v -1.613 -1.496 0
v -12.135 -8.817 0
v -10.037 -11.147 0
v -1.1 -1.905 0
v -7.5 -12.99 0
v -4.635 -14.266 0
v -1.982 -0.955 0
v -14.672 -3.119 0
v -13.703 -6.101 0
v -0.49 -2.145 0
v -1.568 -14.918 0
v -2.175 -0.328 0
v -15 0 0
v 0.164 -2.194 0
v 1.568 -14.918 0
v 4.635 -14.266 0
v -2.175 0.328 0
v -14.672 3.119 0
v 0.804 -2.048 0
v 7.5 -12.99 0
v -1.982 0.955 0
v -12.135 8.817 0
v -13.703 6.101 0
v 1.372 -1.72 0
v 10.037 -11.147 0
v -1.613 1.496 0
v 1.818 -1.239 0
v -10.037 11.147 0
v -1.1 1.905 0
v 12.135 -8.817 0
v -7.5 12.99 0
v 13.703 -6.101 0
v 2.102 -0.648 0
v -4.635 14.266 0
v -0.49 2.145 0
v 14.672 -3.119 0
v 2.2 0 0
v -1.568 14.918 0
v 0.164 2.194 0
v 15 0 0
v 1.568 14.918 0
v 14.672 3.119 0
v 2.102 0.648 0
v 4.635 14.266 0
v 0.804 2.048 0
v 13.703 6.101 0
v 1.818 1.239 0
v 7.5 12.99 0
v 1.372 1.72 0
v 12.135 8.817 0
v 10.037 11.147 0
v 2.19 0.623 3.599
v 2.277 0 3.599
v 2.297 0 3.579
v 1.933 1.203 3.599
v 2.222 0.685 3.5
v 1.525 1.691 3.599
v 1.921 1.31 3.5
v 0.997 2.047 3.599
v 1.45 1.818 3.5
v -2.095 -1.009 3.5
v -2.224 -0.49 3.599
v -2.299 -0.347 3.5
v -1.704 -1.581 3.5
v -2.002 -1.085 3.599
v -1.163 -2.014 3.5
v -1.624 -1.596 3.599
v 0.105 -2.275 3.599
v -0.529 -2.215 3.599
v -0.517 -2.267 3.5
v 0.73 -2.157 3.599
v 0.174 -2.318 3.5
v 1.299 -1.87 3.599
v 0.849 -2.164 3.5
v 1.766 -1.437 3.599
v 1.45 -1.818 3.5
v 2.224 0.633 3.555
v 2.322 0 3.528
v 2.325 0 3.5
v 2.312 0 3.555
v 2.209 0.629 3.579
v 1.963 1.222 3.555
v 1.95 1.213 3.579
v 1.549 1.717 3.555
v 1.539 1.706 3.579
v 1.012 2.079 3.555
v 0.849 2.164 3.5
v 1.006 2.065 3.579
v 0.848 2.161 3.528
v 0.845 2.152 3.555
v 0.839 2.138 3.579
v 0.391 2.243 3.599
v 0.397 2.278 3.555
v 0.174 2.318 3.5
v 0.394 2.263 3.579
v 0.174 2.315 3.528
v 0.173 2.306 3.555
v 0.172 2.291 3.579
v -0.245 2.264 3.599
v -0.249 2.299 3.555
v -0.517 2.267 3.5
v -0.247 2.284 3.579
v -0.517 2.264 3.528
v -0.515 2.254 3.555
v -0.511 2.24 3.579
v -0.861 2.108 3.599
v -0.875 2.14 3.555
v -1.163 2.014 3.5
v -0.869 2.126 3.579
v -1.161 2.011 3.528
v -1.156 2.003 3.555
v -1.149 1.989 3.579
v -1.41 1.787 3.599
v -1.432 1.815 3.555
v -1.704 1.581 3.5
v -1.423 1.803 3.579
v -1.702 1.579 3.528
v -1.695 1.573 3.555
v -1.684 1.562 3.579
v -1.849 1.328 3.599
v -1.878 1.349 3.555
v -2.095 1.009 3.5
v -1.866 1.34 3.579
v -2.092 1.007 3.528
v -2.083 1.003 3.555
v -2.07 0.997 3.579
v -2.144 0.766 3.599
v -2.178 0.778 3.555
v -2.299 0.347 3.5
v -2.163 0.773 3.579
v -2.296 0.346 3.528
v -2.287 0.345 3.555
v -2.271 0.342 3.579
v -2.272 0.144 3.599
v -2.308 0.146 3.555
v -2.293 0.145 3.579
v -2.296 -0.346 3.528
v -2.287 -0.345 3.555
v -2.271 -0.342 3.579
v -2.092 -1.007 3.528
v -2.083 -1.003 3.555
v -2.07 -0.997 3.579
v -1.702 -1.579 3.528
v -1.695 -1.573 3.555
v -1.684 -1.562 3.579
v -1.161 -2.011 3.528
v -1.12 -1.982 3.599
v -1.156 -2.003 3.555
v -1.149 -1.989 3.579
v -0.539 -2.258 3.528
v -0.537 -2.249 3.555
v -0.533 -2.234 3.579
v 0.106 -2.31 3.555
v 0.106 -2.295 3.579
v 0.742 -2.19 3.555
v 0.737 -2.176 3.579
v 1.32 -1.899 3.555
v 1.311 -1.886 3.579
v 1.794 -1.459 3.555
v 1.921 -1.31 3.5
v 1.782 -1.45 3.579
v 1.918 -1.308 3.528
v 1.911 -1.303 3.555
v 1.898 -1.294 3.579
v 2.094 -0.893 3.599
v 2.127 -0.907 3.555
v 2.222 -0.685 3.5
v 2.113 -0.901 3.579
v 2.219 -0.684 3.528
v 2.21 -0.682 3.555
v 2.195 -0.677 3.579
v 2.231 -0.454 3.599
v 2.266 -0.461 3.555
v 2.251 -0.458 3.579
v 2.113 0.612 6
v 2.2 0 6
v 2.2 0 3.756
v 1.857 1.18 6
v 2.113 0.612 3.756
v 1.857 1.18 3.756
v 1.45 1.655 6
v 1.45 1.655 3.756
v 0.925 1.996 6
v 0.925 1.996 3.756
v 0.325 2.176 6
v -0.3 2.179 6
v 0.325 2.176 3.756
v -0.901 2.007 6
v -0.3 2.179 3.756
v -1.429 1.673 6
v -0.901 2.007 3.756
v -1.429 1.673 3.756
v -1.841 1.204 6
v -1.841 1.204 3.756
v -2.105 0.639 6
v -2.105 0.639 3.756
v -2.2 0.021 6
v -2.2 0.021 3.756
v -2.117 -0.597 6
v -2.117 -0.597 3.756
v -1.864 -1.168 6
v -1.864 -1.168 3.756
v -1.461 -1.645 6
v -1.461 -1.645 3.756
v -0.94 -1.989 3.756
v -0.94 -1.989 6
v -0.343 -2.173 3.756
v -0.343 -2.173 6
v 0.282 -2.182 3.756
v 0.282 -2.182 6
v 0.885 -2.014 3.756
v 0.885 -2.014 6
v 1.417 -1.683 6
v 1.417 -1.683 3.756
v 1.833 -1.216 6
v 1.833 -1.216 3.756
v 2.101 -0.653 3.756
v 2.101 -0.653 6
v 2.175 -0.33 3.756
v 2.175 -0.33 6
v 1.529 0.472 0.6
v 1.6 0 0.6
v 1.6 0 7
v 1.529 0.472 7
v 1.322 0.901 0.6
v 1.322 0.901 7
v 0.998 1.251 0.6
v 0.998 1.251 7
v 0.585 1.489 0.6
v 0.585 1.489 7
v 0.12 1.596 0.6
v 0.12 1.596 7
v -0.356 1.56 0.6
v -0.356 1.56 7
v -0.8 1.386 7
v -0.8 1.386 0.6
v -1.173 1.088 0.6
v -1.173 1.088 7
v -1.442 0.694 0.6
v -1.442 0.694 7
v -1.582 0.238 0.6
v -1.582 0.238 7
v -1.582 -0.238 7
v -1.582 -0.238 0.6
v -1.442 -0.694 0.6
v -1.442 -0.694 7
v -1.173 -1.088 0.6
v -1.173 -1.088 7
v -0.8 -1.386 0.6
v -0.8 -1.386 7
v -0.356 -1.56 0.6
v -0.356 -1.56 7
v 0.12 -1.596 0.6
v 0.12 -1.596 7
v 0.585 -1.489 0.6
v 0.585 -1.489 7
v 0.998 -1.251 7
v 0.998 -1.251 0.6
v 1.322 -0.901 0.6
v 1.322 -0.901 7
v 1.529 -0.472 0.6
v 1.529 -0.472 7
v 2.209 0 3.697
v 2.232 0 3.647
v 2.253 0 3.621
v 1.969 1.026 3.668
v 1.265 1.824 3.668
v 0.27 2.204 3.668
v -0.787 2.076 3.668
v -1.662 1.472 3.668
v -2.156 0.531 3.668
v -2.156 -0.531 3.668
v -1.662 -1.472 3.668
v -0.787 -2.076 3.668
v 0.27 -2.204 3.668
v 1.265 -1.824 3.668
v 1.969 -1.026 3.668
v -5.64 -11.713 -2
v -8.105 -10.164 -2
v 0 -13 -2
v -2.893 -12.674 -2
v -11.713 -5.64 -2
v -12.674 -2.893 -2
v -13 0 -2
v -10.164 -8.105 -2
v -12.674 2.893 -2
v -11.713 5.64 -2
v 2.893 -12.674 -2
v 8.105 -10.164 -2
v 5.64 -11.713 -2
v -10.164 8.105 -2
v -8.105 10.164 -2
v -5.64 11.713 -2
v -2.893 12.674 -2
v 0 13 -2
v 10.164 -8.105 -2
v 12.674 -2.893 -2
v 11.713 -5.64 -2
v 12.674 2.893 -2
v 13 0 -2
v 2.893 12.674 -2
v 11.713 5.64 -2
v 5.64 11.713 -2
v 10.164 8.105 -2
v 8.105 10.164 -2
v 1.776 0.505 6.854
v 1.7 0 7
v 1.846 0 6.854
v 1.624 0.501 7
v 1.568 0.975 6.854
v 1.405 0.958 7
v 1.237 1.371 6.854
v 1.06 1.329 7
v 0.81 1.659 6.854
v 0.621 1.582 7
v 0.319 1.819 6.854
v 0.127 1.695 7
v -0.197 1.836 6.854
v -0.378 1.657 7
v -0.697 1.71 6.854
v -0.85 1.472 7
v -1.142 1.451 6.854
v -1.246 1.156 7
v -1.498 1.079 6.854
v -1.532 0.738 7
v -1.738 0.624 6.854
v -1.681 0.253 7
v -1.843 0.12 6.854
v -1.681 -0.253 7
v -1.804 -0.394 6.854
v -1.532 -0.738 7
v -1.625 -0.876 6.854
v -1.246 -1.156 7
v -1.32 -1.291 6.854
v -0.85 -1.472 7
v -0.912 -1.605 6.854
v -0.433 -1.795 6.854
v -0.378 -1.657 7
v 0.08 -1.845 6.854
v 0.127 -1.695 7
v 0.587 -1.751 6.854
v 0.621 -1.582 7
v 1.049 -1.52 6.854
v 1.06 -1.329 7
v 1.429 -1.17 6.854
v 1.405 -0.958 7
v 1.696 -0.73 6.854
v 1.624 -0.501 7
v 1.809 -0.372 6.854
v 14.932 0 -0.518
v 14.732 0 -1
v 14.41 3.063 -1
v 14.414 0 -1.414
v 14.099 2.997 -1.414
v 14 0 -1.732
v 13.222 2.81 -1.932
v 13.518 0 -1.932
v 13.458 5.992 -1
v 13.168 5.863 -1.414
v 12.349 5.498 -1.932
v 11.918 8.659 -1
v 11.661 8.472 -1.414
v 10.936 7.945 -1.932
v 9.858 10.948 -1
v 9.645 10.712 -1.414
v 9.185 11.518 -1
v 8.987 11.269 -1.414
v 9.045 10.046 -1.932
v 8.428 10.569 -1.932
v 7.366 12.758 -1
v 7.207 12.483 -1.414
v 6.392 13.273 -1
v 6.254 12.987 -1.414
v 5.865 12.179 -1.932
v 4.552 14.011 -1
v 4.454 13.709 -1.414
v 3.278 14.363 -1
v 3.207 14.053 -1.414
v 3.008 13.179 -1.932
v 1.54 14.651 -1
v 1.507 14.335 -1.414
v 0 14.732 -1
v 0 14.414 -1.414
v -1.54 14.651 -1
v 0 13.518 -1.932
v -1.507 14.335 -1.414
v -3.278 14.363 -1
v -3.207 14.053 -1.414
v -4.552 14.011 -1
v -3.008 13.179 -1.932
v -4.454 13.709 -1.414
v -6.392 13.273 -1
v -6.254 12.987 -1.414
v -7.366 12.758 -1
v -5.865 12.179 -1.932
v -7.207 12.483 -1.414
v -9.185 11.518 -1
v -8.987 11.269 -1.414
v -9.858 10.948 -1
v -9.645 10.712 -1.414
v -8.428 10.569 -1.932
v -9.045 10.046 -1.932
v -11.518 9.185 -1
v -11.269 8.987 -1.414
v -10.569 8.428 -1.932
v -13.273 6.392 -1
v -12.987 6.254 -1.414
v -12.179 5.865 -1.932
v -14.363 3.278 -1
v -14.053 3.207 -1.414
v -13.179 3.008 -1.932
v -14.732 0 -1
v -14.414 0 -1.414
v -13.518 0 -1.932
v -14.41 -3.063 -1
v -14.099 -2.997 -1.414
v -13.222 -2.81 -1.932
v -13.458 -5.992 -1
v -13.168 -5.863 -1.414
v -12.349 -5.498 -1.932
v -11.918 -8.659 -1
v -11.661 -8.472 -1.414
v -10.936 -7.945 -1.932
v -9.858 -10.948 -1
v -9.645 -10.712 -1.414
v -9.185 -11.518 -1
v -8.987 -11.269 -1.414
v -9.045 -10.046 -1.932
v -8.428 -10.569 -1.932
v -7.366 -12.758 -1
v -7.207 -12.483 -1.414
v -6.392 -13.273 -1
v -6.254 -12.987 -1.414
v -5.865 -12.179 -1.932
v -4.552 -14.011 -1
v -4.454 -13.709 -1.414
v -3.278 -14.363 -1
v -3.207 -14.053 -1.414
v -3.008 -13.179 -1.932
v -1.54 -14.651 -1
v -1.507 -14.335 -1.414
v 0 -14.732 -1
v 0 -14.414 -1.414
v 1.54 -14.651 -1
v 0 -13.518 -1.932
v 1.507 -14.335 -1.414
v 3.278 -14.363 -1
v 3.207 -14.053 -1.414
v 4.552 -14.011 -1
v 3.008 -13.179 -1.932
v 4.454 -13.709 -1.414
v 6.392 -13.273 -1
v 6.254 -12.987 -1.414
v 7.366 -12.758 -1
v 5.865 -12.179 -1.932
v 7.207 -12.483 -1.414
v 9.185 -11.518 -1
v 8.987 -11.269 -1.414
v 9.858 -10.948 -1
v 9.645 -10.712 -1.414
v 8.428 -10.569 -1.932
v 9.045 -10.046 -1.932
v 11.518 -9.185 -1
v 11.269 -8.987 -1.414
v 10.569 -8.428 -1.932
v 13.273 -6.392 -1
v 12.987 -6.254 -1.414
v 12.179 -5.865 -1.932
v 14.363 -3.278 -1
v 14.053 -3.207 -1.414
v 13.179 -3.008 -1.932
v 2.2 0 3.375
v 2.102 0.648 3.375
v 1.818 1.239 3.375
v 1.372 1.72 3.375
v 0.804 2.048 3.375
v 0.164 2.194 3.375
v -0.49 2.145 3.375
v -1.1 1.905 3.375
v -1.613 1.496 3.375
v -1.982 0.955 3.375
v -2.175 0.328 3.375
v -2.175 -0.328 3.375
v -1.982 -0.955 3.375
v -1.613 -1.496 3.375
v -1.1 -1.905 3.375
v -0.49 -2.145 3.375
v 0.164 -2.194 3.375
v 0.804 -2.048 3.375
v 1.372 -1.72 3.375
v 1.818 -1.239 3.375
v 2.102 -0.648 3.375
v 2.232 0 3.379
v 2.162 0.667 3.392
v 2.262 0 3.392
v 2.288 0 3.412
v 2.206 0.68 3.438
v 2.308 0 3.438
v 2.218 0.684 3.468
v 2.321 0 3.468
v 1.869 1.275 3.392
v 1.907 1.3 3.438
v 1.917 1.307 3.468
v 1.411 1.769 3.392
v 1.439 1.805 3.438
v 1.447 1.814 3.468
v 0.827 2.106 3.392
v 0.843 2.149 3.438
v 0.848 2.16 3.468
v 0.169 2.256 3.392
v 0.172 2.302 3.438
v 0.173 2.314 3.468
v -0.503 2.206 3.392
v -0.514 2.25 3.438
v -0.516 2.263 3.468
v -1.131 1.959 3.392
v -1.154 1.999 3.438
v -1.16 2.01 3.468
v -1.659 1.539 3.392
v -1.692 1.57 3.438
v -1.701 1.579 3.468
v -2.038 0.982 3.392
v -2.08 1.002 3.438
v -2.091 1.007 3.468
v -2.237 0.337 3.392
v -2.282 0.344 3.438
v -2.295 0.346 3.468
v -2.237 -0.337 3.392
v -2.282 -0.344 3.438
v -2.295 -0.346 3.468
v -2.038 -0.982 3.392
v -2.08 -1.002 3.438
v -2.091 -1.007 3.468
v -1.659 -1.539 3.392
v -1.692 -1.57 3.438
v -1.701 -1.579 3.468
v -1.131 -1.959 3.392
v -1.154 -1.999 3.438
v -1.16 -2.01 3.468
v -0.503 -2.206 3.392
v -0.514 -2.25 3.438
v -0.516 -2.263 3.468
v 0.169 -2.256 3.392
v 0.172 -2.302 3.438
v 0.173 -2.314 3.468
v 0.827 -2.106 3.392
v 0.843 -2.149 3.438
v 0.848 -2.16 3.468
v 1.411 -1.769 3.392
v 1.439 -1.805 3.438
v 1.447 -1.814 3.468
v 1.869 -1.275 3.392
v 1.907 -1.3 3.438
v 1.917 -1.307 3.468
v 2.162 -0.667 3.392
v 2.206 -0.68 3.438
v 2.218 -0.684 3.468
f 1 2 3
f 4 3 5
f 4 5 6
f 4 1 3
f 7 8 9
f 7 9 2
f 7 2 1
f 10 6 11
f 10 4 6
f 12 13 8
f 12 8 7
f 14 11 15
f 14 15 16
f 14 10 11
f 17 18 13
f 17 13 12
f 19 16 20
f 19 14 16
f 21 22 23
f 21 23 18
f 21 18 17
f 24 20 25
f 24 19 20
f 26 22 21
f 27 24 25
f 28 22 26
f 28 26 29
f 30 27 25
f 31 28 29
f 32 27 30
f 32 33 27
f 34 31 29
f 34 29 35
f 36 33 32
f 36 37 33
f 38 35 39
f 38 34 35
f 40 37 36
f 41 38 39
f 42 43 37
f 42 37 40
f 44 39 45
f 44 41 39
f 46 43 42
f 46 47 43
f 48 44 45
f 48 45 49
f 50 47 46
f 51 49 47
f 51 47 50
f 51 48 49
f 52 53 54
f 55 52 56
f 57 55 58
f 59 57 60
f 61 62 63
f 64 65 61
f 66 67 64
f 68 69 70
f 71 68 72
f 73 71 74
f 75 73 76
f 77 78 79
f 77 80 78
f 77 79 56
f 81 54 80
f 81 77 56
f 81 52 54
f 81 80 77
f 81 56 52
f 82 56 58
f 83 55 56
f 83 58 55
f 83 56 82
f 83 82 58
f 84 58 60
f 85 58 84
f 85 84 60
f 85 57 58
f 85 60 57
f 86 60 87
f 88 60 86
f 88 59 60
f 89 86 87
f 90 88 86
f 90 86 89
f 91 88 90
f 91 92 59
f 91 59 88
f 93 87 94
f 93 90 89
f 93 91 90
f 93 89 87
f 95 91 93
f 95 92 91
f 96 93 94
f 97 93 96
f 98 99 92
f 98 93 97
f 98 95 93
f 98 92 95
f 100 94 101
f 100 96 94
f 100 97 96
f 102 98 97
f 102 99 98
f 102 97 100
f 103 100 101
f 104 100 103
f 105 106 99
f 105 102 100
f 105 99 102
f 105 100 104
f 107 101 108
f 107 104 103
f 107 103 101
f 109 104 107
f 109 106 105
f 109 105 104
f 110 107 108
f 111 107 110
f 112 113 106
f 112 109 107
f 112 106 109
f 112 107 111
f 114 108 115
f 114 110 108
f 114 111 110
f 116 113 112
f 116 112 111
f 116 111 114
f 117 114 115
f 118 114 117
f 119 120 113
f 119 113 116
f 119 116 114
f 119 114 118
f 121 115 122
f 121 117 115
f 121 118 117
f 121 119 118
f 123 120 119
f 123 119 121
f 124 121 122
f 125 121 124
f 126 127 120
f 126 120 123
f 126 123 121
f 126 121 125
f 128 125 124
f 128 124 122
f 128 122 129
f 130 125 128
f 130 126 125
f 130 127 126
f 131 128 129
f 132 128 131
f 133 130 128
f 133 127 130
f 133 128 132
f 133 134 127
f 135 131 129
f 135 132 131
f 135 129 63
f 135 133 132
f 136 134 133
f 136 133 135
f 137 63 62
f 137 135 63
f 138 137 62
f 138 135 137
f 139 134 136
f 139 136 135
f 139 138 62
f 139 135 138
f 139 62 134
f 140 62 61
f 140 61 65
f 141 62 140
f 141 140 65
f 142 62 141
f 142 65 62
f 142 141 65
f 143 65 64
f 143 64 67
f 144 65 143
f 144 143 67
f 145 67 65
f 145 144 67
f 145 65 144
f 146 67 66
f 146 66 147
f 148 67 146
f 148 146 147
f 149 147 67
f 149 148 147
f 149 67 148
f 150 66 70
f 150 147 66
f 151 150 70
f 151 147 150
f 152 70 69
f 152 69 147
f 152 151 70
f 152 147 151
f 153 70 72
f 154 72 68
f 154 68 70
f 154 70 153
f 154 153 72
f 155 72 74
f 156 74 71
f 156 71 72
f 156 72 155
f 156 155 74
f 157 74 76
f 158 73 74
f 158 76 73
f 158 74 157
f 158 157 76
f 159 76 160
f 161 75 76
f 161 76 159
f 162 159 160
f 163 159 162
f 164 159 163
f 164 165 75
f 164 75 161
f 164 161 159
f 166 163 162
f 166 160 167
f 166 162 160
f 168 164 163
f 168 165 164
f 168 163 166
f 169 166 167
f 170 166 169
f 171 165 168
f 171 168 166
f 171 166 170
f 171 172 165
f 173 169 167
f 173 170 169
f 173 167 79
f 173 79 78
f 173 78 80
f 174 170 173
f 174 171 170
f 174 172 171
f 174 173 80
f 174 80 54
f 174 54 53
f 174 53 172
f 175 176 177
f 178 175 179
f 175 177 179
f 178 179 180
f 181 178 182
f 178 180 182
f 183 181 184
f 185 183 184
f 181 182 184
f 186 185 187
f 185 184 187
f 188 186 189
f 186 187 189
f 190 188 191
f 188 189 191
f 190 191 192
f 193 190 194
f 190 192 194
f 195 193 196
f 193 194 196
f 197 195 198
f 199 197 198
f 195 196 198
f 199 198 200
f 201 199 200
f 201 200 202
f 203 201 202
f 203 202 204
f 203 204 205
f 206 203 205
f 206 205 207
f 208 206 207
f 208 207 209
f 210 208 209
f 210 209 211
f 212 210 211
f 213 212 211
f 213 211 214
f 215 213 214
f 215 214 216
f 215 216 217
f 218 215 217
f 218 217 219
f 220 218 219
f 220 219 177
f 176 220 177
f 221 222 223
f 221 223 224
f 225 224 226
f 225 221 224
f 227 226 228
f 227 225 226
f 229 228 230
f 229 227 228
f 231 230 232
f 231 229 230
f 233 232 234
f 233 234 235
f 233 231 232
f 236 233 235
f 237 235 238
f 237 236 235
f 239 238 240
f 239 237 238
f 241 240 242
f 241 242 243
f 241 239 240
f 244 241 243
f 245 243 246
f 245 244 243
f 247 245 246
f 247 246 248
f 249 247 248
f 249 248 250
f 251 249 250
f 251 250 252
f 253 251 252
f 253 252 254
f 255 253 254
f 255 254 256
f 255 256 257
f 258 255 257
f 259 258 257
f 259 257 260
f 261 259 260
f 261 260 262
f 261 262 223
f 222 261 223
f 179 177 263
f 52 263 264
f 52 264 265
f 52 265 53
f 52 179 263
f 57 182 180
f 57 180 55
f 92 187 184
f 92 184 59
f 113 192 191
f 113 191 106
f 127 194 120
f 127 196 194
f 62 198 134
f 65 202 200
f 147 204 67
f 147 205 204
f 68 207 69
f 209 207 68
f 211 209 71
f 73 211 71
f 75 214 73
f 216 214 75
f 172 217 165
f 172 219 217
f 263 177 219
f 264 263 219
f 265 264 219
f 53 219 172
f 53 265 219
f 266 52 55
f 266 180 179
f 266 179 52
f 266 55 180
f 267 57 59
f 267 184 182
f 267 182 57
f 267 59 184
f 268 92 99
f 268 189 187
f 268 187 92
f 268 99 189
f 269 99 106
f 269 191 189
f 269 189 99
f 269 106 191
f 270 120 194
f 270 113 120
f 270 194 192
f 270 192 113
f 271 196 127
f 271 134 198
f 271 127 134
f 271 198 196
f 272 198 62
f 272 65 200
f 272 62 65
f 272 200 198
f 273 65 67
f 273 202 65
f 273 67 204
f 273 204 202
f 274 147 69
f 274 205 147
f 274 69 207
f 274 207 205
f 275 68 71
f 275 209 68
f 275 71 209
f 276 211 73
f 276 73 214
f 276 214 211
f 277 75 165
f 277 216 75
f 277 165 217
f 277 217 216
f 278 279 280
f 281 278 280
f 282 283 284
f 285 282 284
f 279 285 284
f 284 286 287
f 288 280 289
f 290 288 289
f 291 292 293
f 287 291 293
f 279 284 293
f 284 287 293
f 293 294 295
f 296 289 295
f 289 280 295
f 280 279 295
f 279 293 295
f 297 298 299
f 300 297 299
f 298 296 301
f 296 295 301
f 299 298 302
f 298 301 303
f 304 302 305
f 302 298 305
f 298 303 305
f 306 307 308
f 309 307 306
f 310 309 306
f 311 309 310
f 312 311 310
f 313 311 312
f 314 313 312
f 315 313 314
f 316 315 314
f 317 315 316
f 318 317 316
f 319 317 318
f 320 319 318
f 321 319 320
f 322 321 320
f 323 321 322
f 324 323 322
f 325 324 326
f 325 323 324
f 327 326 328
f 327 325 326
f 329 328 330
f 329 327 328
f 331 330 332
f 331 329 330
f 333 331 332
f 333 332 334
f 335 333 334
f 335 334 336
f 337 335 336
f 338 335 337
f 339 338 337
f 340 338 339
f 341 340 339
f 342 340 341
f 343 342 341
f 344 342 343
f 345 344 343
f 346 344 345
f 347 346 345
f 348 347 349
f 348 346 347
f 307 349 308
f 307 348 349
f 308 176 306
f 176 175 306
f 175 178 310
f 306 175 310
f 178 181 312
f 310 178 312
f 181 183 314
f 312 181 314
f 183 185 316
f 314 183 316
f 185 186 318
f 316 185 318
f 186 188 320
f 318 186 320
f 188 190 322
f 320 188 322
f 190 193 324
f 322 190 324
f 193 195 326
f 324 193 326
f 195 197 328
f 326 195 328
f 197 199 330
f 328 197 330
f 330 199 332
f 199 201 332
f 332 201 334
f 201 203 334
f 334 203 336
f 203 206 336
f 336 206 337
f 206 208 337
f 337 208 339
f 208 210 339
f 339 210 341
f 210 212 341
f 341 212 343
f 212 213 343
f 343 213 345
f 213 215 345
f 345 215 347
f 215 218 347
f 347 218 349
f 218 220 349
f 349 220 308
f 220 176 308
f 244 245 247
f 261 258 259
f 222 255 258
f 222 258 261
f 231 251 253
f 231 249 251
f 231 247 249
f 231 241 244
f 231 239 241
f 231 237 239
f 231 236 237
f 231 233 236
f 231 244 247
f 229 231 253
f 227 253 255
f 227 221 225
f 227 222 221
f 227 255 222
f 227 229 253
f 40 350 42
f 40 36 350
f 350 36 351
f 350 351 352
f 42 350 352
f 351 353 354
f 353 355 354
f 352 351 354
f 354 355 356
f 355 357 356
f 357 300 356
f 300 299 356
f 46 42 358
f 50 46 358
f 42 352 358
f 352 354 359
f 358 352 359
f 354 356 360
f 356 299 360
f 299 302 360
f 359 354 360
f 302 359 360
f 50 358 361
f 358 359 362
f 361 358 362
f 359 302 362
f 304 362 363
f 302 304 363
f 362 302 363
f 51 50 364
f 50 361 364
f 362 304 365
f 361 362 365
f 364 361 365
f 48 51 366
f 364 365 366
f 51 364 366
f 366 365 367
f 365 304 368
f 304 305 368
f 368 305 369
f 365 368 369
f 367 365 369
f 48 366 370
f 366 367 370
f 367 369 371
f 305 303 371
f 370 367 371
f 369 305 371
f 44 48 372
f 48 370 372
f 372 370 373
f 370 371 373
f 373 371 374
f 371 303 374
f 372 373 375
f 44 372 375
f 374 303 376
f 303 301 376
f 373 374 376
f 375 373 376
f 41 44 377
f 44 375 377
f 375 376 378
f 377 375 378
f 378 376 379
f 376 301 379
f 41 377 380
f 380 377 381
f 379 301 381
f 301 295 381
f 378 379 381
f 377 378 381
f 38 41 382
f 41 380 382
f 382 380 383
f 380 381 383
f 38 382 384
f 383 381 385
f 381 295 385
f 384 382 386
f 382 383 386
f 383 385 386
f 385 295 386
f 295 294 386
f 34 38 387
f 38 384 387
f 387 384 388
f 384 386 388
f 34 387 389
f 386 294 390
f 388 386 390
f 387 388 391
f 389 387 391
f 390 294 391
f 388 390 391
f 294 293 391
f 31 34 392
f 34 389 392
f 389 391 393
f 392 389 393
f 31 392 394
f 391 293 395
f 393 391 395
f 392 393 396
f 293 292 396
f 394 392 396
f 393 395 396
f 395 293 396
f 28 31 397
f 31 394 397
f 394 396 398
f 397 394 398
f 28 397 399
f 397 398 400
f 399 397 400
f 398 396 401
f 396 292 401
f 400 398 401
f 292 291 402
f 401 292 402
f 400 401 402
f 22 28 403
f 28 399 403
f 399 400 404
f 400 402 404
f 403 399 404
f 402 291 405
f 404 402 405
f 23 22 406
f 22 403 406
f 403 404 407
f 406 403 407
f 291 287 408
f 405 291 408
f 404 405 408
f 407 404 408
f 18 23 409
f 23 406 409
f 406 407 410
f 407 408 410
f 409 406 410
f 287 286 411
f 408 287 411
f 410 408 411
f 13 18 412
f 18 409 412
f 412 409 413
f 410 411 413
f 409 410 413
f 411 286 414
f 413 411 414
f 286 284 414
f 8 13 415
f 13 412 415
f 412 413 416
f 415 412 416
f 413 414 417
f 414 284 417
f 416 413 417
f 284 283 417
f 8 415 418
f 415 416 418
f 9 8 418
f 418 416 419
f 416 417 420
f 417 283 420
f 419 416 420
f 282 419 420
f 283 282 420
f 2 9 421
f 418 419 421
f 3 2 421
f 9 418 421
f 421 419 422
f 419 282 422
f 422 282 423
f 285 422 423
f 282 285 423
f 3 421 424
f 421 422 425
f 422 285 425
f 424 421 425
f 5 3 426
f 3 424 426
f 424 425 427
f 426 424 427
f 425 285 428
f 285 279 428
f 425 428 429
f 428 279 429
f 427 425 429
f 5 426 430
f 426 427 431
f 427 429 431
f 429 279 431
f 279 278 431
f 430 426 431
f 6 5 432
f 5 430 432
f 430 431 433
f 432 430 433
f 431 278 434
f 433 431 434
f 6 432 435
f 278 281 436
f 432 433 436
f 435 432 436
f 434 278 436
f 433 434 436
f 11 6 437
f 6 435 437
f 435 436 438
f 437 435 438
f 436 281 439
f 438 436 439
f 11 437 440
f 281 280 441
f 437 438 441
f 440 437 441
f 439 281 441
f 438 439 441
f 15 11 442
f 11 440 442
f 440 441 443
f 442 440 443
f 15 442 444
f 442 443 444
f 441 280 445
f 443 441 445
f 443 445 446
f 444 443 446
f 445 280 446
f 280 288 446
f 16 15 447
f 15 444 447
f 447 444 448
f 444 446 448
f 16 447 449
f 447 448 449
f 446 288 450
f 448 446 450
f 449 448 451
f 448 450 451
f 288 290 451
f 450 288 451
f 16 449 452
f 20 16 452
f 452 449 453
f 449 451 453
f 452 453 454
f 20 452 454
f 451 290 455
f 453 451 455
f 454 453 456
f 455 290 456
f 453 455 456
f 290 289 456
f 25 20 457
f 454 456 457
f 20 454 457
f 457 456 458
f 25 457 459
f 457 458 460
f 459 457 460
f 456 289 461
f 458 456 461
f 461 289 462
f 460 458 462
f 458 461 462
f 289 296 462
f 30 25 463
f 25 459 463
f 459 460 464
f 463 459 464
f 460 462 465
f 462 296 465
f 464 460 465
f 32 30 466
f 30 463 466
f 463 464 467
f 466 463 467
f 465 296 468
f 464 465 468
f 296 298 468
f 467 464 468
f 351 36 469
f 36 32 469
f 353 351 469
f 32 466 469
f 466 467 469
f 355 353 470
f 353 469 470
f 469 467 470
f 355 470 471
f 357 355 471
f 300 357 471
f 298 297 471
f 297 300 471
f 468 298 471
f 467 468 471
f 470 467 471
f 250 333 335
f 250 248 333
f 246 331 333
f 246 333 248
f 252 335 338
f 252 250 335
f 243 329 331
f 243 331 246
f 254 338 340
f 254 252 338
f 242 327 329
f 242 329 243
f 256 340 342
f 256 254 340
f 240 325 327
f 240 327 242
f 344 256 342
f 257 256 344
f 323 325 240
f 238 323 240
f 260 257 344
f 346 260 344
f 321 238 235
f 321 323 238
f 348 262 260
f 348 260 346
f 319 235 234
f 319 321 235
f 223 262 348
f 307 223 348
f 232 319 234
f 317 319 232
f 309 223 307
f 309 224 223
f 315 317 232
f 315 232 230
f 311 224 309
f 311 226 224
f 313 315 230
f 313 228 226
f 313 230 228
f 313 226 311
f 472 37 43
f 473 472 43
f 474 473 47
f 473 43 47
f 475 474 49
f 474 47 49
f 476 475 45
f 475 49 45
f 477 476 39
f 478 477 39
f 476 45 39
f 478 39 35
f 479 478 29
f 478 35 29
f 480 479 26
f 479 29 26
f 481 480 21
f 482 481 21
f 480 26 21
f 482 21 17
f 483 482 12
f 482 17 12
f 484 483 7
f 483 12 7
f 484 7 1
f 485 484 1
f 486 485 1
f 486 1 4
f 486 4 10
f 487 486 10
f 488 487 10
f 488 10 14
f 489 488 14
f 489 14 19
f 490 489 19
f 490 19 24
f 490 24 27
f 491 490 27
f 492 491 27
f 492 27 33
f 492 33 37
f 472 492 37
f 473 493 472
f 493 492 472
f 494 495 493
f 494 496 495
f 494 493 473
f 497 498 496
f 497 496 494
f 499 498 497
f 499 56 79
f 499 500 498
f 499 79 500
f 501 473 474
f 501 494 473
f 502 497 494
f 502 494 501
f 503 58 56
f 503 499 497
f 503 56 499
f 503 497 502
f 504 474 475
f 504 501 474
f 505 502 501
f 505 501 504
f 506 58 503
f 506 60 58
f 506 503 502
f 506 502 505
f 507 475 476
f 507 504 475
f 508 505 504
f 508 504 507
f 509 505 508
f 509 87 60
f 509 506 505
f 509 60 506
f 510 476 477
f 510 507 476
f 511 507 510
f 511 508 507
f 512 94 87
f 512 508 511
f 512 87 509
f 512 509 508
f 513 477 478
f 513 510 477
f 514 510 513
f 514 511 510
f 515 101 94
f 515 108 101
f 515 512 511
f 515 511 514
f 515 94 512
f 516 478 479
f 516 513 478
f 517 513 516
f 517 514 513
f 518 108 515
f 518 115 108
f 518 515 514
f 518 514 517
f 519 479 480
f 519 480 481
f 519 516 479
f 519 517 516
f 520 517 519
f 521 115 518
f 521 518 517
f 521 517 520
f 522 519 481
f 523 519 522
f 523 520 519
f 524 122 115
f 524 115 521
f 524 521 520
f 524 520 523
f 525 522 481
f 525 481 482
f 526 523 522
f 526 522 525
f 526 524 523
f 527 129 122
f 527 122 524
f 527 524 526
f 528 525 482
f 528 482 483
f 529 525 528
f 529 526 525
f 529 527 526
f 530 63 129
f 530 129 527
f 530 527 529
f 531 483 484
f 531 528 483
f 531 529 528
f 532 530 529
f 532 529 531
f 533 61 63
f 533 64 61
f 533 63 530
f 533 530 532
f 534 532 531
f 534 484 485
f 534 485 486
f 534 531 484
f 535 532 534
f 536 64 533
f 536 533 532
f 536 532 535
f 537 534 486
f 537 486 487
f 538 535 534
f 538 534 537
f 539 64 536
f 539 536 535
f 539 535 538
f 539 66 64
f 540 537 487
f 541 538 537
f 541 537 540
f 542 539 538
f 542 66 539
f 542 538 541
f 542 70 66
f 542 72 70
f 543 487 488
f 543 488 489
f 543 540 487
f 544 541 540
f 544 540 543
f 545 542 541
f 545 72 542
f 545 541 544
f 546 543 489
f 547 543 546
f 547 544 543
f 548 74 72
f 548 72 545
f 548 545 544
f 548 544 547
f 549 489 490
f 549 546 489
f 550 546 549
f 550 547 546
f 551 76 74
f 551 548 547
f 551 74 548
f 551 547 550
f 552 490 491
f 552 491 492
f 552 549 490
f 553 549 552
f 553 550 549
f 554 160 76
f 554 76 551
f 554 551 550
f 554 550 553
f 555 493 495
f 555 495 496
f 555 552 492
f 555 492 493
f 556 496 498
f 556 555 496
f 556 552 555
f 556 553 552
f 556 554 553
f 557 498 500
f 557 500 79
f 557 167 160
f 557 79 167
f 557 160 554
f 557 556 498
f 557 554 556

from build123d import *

# Parameters (mm, degrees)
F0_R     = 2.2
F1_DEPTH = 7
F2_T     = -0.6
F0_R_2   = 15
F3_DEPTH = 2
F4_R     = 1.99999
F7_SIZE  = 0.5
F8_SIZE  = 0.5
F9_R     = 0.2


# Not quite as in the source:
# - a fillet or chamfer is up to 0.001 mm smaller than in the source, because OpenCascade refuses the exact size


with BuildPart() as f1:
    # F0 (on Top) → F1 (new body)
    with BuildSketch(Plane.XY):
        Circle(F0_R)
    extrude(amount=F1_DEPTH)

    # F2
    f2_openings = [f1.faces().sort_by_distance(p)[0] for p in [
        (0, 0, 7),
    ]]
    offset(amount=F2_T, openings=f2_openings)

    # F0 (on Top) → F3 (join)
    with BuildSketch(Plane.XY):
        Circle(F0_R_2)
        Circle(F0_R, mode=Mode.SUBTRACT)
        Circle(F0_R)
    extrude(amount=-F3_DEPTH)

    # F4 (radius 2 in the source; OpenCascade refuses exactly that, so slightly less here)
    f4_edges = [f1.edges().sort_by_distance(p)[0] for p in [
        (-15, 0, -2),
    ]]
    fillet(f4_edges, radius=F4_R)

    # F5 (on Front) → F6 (revolve)
    with BuildSketch(Plane.XZ):
        with BuildLine():
            ThreePointArc((2.075, 3.5), (2.1116116524, 3.4116116524), (2.2, 3.375))
            Line((2.2, 3.375), (2.2, 3.5))
            Line((2.2, 3.5), (2.075, 3.5))
        make_face()
        with BuildLine():
            Line((2.2, 3.5), (2.2, 3.375))
            ThreePointArc((2.2, 3.375), (2.2883883476, 3.4116116524), (2.325, 3.5))
            ThreePointArc((2.325, 3.5), (2.2, 3.625), (2.075, 3.5))
            Line((2.075, 3.5), (2.2, 3.5))
        make_face()
    revolve(axis=Axis((0, 0, 1.75), (0, 0, 1)))

    # F7
    f7_edges = [f1.edges().sort_by_distance(p)[0] for p in [
        (-2.2, 0, 7),
    ]]
    chamfer(f7_edges, length=F7_SIZE)

    # F8
    f8_edges = [f1.edges().sort_by_distance(p)[0] for p in [
        (-2.2, 0, 6.5),
    ]]
    chamfer(f8_edges, length=F8_SIZE)

    # F9
    f9_edges = [f1.edges().sort_by_distance(p)[0] for p in [
        (-2.2, 0, 3.625),
    ]]
    fillet(f9_edges, radius=F9_R)


solid = f1.part
